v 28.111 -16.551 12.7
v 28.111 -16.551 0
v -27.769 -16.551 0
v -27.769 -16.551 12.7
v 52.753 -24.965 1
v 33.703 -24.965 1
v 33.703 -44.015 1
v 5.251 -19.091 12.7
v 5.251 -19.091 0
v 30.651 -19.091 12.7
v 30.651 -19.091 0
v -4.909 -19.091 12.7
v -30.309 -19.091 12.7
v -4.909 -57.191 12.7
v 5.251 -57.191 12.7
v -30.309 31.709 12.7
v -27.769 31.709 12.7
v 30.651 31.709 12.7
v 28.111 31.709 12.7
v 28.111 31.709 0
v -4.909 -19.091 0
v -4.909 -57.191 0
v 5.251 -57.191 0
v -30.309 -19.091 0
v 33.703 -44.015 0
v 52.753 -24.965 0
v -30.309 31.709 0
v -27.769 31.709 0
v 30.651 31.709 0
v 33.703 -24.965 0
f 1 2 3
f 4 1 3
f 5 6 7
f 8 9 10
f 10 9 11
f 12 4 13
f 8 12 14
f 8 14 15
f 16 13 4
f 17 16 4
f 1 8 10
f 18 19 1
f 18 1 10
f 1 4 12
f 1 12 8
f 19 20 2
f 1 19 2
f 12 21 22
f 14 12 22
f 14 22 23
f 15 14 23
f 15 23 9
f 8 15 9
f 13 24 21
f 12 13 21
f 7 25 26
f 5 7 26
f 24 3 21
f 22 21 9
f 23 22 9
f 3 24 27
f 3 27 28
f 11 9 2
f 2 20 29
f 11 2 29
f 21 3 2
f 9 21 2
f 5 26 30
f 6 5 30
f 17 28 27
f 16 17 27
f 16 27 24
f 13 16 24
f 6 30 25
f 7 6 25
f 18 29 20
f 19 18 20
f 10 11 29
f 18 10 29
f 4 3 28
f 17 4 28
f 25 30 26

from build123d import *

# Parameters (mm, degrees)
F1_DEPTH = 12.7
F3_DEPTH = 1


with BuildPart() as f1:
    # F0 (on Top) → F1 (new body)
    with BuildSketch(Plane.XY):
        Polygon((-4.908747, -19.090921), (-4.908747, -57.190921), (5.251253, -57.190921), (5.251253, -19.090921), (30.651253, -19.090921), (30.651253, 31.709079), (28.111253, 31.709079), (28.111253, -16.550921), (-27.768747, -16.550921), (-27.768747, 31.709079), (-30.308747, 31.709079), (-30.308747, -19.090921), align=None)
    extrude(amount=F1_DEPTH)


with BuildPart() as f3:
    # F2 (on Top) → F3 (new body)
    with BuildSketch(Plane.XY):
        Polygon((52.753499, -24.96505), (33.703499, -24.96505), (33.703499, -44.01505), align=None)
    extrude(amount=F3_DEPTH)


solid = Compound([f1.part, f3.part])
